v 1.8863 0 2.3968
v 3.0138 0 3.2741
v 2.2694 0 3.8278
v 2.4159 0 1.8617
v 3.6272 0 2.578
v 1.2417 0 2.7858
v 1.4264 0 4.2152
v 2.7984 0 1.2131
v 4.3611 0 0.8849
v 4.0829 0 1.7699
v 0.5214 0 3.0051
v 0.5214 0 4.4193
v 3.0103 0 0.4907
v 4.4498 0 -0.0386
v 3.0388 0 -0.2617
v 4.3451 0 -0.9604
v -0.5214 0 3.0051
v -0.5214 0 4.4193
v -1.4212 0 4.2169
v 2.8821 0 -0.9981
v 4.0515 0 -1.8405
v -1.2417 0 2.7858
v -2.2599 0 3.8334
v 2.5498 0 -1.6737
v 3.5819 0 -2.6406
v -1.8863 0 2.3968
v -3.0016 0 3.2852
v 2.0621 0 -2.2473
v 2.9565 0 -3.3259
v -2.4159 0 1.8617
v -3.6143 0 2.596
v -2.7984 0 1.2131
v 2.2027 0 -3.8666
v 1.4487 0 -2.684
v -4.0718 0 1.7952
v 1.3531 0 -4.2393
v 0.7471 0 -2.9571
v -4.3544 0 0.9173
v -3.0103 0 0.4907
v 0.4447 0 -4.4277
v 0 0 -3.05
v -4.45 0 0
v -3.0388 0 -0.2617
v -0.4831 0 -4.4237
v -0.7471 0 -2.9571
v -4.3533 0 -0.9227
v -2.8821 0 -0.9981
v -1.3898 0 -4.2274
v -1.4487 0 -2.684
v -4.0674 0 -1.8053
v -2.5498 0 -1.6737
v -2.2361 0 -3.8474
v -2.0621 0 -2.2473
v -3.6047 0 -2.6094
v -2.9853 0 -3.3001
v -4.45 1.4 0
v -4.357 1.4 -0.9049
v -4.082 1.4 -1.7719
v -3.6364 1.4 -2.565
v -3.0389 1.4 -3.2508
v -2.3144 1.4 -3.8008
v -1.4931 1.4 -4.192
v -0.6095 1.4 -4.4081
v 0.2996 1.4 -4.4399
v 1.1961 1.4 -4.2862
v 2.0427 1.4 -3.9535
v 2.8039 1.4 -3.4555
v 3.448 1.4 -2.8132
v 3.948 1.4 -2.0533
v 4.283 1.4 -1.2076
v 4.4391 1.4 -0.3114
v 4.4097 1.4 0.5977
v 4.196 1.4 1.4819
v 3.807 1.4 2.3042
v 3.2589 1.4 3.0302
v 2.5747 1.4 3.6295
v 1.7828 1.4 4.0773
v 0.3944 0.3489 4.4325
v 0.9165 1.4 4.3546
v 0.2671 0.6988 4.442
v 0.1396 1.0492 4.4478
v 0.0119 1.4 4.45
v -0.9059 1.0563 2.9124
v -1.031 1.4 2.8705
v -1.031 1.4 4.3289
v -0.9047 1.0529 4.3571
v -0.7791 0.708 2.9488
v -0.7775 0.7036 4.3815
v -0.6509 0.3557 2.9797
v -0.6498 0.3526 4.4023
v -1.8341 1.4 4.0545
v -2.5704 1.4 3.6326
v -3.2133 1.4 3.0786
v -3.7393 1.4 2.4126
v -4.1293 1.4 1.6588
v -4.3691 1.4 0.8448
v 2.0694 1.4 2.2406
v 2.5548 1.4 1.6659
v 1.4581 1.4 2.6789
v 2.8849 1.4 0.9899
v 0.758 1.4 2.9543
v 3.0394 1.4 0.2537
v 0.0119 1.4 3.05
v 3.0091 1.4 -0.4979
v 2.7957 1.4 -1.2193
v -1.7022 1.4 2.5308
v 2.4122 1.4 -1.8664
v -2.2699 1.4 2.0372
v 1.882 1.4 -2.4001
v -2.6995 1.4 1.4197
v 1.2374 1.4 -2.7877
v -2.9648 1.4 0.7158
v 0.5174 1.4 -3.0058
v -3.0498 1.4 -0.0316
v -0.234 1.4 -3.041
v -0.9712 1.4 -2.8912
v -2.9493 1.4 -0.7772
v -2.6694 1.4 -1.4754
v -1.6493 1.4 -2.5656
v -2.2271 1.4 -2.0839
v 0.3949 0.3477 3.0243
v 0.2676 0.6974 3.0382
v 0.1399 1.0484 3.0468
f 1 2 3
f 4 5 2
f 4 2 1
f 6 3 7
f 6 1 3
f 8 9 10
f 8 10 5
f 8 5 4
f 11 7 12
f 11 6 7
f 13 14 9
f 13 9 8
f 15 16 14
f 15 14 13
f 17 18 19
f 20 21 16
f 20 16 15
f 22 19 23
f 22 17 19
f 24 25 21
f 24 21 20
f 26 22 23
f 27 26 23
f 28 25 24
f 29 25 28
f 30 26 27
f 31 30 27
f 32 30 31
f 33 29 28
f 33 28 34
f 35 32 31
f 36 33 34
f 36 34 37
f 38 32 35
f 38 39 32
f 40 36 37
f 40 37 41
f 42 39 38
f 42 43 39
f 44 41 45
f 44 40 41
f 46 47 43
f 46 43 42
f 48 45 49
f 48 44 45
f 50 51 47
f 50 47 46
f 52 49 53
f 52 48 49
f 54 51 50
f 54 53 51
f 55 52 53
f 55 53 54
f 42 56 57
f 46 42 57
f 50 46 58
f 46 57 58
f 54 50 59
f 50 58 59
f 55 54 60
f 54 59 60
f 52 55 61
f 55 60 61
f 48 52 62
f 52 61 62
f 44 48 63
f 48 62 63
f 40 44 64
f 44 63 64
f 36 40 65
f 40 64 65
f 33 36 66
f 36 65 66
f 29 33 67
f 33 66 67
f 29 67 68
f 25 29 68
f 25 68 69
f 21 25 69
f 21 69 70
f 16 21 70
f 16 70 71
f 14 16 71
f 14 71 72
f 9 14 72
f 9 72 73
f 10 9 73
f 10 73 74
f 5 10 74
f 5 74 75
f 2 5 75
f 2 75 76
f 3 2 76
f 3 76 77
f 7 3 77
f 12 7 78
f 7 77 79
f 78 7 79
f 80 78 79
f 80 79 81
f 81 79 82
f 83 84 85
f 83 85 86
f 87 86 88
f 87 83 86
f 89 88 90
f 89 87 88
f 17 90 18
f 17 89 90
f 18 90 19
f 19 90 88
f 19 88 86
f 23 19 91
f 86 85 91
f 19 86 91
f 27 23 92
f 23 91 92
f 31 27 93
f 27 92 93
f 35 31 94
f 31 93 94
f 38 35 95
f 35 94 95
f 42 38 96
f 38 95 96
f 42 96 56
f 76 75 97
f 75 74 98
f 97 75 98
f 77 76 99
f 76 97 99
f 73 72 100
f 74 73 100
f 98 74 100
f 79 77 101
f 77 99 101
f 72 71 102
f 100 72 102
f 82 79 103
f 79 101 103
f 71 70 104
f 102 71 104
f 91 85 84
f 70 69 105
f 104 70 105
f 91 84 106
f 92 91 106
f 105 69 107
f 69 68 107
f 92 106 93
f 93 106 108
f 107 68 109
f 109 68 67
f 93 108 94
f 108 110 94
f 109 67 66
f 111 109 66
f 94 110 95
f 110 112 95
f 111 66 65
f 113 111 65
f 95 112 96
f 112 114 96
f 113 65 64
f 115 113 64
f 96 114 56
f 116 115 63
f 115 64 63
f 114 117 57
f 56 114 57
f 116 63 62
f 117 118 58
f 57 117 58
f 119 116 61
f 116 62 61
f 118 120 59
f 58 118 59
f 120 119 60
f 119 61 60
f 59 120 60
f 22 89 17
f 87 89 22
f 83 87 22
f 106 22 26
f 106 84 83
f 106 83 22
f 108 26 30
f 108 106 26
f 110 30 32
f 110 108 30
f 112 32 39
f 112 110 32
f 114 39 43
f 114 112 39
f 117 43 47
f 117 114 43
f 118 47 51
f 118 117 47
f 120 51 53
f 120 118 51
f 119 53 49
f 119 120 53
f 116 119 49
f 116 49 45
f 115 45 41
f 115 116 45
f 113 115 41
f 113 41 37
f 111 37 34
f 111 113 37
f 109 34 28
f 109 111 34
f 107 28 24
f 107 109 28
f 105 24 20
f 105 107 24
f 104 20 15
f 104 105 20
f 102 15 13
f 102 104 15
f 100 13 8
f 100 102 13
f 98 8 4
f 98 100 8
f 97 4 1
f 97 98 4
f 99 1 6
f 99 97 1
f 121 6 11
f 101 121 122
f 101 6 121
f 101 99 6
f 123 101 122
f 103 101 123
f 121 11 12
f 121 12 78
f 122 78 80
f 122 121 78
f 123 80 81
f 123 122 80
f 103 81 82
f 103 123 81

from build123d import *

# Parameters (mm, degrees)
SKE_W     = 1.4
SKE_H     = 1.4
CUT_REACH = 6.45


with BuildPart() as part:
    # Ske → Base (revolve)
    with BuildSketch(Plane.XY):
        with Locations((-3.75, 0.7)):
            Rectangle(SKE_W, SKE_H)
    revolve(axis=Axis((0, 15.759672306, 0), (0, -1, 0)))

    # Ske4 → Cut (cut, up to next)
    with BuildSketch(Plane.XY, mode=Mode.PRIVATE) as cut_sk1:
        Polygon((-0.521447109, 0), (0.521447109, 0), (0.011888781, 1.4), (-1.031005436, 1.4), align=None)
    cut_tool1 = extrude(cut_sk1.sketch, amount=CUT_REACH, mode=Mode.PRIVATE) & part.part
    add(cut_tool1.solids().sort_by_distance((-0.254779, 0.7, 0))[0], mode=Mode.SUBTRACT)


solid = part.part
